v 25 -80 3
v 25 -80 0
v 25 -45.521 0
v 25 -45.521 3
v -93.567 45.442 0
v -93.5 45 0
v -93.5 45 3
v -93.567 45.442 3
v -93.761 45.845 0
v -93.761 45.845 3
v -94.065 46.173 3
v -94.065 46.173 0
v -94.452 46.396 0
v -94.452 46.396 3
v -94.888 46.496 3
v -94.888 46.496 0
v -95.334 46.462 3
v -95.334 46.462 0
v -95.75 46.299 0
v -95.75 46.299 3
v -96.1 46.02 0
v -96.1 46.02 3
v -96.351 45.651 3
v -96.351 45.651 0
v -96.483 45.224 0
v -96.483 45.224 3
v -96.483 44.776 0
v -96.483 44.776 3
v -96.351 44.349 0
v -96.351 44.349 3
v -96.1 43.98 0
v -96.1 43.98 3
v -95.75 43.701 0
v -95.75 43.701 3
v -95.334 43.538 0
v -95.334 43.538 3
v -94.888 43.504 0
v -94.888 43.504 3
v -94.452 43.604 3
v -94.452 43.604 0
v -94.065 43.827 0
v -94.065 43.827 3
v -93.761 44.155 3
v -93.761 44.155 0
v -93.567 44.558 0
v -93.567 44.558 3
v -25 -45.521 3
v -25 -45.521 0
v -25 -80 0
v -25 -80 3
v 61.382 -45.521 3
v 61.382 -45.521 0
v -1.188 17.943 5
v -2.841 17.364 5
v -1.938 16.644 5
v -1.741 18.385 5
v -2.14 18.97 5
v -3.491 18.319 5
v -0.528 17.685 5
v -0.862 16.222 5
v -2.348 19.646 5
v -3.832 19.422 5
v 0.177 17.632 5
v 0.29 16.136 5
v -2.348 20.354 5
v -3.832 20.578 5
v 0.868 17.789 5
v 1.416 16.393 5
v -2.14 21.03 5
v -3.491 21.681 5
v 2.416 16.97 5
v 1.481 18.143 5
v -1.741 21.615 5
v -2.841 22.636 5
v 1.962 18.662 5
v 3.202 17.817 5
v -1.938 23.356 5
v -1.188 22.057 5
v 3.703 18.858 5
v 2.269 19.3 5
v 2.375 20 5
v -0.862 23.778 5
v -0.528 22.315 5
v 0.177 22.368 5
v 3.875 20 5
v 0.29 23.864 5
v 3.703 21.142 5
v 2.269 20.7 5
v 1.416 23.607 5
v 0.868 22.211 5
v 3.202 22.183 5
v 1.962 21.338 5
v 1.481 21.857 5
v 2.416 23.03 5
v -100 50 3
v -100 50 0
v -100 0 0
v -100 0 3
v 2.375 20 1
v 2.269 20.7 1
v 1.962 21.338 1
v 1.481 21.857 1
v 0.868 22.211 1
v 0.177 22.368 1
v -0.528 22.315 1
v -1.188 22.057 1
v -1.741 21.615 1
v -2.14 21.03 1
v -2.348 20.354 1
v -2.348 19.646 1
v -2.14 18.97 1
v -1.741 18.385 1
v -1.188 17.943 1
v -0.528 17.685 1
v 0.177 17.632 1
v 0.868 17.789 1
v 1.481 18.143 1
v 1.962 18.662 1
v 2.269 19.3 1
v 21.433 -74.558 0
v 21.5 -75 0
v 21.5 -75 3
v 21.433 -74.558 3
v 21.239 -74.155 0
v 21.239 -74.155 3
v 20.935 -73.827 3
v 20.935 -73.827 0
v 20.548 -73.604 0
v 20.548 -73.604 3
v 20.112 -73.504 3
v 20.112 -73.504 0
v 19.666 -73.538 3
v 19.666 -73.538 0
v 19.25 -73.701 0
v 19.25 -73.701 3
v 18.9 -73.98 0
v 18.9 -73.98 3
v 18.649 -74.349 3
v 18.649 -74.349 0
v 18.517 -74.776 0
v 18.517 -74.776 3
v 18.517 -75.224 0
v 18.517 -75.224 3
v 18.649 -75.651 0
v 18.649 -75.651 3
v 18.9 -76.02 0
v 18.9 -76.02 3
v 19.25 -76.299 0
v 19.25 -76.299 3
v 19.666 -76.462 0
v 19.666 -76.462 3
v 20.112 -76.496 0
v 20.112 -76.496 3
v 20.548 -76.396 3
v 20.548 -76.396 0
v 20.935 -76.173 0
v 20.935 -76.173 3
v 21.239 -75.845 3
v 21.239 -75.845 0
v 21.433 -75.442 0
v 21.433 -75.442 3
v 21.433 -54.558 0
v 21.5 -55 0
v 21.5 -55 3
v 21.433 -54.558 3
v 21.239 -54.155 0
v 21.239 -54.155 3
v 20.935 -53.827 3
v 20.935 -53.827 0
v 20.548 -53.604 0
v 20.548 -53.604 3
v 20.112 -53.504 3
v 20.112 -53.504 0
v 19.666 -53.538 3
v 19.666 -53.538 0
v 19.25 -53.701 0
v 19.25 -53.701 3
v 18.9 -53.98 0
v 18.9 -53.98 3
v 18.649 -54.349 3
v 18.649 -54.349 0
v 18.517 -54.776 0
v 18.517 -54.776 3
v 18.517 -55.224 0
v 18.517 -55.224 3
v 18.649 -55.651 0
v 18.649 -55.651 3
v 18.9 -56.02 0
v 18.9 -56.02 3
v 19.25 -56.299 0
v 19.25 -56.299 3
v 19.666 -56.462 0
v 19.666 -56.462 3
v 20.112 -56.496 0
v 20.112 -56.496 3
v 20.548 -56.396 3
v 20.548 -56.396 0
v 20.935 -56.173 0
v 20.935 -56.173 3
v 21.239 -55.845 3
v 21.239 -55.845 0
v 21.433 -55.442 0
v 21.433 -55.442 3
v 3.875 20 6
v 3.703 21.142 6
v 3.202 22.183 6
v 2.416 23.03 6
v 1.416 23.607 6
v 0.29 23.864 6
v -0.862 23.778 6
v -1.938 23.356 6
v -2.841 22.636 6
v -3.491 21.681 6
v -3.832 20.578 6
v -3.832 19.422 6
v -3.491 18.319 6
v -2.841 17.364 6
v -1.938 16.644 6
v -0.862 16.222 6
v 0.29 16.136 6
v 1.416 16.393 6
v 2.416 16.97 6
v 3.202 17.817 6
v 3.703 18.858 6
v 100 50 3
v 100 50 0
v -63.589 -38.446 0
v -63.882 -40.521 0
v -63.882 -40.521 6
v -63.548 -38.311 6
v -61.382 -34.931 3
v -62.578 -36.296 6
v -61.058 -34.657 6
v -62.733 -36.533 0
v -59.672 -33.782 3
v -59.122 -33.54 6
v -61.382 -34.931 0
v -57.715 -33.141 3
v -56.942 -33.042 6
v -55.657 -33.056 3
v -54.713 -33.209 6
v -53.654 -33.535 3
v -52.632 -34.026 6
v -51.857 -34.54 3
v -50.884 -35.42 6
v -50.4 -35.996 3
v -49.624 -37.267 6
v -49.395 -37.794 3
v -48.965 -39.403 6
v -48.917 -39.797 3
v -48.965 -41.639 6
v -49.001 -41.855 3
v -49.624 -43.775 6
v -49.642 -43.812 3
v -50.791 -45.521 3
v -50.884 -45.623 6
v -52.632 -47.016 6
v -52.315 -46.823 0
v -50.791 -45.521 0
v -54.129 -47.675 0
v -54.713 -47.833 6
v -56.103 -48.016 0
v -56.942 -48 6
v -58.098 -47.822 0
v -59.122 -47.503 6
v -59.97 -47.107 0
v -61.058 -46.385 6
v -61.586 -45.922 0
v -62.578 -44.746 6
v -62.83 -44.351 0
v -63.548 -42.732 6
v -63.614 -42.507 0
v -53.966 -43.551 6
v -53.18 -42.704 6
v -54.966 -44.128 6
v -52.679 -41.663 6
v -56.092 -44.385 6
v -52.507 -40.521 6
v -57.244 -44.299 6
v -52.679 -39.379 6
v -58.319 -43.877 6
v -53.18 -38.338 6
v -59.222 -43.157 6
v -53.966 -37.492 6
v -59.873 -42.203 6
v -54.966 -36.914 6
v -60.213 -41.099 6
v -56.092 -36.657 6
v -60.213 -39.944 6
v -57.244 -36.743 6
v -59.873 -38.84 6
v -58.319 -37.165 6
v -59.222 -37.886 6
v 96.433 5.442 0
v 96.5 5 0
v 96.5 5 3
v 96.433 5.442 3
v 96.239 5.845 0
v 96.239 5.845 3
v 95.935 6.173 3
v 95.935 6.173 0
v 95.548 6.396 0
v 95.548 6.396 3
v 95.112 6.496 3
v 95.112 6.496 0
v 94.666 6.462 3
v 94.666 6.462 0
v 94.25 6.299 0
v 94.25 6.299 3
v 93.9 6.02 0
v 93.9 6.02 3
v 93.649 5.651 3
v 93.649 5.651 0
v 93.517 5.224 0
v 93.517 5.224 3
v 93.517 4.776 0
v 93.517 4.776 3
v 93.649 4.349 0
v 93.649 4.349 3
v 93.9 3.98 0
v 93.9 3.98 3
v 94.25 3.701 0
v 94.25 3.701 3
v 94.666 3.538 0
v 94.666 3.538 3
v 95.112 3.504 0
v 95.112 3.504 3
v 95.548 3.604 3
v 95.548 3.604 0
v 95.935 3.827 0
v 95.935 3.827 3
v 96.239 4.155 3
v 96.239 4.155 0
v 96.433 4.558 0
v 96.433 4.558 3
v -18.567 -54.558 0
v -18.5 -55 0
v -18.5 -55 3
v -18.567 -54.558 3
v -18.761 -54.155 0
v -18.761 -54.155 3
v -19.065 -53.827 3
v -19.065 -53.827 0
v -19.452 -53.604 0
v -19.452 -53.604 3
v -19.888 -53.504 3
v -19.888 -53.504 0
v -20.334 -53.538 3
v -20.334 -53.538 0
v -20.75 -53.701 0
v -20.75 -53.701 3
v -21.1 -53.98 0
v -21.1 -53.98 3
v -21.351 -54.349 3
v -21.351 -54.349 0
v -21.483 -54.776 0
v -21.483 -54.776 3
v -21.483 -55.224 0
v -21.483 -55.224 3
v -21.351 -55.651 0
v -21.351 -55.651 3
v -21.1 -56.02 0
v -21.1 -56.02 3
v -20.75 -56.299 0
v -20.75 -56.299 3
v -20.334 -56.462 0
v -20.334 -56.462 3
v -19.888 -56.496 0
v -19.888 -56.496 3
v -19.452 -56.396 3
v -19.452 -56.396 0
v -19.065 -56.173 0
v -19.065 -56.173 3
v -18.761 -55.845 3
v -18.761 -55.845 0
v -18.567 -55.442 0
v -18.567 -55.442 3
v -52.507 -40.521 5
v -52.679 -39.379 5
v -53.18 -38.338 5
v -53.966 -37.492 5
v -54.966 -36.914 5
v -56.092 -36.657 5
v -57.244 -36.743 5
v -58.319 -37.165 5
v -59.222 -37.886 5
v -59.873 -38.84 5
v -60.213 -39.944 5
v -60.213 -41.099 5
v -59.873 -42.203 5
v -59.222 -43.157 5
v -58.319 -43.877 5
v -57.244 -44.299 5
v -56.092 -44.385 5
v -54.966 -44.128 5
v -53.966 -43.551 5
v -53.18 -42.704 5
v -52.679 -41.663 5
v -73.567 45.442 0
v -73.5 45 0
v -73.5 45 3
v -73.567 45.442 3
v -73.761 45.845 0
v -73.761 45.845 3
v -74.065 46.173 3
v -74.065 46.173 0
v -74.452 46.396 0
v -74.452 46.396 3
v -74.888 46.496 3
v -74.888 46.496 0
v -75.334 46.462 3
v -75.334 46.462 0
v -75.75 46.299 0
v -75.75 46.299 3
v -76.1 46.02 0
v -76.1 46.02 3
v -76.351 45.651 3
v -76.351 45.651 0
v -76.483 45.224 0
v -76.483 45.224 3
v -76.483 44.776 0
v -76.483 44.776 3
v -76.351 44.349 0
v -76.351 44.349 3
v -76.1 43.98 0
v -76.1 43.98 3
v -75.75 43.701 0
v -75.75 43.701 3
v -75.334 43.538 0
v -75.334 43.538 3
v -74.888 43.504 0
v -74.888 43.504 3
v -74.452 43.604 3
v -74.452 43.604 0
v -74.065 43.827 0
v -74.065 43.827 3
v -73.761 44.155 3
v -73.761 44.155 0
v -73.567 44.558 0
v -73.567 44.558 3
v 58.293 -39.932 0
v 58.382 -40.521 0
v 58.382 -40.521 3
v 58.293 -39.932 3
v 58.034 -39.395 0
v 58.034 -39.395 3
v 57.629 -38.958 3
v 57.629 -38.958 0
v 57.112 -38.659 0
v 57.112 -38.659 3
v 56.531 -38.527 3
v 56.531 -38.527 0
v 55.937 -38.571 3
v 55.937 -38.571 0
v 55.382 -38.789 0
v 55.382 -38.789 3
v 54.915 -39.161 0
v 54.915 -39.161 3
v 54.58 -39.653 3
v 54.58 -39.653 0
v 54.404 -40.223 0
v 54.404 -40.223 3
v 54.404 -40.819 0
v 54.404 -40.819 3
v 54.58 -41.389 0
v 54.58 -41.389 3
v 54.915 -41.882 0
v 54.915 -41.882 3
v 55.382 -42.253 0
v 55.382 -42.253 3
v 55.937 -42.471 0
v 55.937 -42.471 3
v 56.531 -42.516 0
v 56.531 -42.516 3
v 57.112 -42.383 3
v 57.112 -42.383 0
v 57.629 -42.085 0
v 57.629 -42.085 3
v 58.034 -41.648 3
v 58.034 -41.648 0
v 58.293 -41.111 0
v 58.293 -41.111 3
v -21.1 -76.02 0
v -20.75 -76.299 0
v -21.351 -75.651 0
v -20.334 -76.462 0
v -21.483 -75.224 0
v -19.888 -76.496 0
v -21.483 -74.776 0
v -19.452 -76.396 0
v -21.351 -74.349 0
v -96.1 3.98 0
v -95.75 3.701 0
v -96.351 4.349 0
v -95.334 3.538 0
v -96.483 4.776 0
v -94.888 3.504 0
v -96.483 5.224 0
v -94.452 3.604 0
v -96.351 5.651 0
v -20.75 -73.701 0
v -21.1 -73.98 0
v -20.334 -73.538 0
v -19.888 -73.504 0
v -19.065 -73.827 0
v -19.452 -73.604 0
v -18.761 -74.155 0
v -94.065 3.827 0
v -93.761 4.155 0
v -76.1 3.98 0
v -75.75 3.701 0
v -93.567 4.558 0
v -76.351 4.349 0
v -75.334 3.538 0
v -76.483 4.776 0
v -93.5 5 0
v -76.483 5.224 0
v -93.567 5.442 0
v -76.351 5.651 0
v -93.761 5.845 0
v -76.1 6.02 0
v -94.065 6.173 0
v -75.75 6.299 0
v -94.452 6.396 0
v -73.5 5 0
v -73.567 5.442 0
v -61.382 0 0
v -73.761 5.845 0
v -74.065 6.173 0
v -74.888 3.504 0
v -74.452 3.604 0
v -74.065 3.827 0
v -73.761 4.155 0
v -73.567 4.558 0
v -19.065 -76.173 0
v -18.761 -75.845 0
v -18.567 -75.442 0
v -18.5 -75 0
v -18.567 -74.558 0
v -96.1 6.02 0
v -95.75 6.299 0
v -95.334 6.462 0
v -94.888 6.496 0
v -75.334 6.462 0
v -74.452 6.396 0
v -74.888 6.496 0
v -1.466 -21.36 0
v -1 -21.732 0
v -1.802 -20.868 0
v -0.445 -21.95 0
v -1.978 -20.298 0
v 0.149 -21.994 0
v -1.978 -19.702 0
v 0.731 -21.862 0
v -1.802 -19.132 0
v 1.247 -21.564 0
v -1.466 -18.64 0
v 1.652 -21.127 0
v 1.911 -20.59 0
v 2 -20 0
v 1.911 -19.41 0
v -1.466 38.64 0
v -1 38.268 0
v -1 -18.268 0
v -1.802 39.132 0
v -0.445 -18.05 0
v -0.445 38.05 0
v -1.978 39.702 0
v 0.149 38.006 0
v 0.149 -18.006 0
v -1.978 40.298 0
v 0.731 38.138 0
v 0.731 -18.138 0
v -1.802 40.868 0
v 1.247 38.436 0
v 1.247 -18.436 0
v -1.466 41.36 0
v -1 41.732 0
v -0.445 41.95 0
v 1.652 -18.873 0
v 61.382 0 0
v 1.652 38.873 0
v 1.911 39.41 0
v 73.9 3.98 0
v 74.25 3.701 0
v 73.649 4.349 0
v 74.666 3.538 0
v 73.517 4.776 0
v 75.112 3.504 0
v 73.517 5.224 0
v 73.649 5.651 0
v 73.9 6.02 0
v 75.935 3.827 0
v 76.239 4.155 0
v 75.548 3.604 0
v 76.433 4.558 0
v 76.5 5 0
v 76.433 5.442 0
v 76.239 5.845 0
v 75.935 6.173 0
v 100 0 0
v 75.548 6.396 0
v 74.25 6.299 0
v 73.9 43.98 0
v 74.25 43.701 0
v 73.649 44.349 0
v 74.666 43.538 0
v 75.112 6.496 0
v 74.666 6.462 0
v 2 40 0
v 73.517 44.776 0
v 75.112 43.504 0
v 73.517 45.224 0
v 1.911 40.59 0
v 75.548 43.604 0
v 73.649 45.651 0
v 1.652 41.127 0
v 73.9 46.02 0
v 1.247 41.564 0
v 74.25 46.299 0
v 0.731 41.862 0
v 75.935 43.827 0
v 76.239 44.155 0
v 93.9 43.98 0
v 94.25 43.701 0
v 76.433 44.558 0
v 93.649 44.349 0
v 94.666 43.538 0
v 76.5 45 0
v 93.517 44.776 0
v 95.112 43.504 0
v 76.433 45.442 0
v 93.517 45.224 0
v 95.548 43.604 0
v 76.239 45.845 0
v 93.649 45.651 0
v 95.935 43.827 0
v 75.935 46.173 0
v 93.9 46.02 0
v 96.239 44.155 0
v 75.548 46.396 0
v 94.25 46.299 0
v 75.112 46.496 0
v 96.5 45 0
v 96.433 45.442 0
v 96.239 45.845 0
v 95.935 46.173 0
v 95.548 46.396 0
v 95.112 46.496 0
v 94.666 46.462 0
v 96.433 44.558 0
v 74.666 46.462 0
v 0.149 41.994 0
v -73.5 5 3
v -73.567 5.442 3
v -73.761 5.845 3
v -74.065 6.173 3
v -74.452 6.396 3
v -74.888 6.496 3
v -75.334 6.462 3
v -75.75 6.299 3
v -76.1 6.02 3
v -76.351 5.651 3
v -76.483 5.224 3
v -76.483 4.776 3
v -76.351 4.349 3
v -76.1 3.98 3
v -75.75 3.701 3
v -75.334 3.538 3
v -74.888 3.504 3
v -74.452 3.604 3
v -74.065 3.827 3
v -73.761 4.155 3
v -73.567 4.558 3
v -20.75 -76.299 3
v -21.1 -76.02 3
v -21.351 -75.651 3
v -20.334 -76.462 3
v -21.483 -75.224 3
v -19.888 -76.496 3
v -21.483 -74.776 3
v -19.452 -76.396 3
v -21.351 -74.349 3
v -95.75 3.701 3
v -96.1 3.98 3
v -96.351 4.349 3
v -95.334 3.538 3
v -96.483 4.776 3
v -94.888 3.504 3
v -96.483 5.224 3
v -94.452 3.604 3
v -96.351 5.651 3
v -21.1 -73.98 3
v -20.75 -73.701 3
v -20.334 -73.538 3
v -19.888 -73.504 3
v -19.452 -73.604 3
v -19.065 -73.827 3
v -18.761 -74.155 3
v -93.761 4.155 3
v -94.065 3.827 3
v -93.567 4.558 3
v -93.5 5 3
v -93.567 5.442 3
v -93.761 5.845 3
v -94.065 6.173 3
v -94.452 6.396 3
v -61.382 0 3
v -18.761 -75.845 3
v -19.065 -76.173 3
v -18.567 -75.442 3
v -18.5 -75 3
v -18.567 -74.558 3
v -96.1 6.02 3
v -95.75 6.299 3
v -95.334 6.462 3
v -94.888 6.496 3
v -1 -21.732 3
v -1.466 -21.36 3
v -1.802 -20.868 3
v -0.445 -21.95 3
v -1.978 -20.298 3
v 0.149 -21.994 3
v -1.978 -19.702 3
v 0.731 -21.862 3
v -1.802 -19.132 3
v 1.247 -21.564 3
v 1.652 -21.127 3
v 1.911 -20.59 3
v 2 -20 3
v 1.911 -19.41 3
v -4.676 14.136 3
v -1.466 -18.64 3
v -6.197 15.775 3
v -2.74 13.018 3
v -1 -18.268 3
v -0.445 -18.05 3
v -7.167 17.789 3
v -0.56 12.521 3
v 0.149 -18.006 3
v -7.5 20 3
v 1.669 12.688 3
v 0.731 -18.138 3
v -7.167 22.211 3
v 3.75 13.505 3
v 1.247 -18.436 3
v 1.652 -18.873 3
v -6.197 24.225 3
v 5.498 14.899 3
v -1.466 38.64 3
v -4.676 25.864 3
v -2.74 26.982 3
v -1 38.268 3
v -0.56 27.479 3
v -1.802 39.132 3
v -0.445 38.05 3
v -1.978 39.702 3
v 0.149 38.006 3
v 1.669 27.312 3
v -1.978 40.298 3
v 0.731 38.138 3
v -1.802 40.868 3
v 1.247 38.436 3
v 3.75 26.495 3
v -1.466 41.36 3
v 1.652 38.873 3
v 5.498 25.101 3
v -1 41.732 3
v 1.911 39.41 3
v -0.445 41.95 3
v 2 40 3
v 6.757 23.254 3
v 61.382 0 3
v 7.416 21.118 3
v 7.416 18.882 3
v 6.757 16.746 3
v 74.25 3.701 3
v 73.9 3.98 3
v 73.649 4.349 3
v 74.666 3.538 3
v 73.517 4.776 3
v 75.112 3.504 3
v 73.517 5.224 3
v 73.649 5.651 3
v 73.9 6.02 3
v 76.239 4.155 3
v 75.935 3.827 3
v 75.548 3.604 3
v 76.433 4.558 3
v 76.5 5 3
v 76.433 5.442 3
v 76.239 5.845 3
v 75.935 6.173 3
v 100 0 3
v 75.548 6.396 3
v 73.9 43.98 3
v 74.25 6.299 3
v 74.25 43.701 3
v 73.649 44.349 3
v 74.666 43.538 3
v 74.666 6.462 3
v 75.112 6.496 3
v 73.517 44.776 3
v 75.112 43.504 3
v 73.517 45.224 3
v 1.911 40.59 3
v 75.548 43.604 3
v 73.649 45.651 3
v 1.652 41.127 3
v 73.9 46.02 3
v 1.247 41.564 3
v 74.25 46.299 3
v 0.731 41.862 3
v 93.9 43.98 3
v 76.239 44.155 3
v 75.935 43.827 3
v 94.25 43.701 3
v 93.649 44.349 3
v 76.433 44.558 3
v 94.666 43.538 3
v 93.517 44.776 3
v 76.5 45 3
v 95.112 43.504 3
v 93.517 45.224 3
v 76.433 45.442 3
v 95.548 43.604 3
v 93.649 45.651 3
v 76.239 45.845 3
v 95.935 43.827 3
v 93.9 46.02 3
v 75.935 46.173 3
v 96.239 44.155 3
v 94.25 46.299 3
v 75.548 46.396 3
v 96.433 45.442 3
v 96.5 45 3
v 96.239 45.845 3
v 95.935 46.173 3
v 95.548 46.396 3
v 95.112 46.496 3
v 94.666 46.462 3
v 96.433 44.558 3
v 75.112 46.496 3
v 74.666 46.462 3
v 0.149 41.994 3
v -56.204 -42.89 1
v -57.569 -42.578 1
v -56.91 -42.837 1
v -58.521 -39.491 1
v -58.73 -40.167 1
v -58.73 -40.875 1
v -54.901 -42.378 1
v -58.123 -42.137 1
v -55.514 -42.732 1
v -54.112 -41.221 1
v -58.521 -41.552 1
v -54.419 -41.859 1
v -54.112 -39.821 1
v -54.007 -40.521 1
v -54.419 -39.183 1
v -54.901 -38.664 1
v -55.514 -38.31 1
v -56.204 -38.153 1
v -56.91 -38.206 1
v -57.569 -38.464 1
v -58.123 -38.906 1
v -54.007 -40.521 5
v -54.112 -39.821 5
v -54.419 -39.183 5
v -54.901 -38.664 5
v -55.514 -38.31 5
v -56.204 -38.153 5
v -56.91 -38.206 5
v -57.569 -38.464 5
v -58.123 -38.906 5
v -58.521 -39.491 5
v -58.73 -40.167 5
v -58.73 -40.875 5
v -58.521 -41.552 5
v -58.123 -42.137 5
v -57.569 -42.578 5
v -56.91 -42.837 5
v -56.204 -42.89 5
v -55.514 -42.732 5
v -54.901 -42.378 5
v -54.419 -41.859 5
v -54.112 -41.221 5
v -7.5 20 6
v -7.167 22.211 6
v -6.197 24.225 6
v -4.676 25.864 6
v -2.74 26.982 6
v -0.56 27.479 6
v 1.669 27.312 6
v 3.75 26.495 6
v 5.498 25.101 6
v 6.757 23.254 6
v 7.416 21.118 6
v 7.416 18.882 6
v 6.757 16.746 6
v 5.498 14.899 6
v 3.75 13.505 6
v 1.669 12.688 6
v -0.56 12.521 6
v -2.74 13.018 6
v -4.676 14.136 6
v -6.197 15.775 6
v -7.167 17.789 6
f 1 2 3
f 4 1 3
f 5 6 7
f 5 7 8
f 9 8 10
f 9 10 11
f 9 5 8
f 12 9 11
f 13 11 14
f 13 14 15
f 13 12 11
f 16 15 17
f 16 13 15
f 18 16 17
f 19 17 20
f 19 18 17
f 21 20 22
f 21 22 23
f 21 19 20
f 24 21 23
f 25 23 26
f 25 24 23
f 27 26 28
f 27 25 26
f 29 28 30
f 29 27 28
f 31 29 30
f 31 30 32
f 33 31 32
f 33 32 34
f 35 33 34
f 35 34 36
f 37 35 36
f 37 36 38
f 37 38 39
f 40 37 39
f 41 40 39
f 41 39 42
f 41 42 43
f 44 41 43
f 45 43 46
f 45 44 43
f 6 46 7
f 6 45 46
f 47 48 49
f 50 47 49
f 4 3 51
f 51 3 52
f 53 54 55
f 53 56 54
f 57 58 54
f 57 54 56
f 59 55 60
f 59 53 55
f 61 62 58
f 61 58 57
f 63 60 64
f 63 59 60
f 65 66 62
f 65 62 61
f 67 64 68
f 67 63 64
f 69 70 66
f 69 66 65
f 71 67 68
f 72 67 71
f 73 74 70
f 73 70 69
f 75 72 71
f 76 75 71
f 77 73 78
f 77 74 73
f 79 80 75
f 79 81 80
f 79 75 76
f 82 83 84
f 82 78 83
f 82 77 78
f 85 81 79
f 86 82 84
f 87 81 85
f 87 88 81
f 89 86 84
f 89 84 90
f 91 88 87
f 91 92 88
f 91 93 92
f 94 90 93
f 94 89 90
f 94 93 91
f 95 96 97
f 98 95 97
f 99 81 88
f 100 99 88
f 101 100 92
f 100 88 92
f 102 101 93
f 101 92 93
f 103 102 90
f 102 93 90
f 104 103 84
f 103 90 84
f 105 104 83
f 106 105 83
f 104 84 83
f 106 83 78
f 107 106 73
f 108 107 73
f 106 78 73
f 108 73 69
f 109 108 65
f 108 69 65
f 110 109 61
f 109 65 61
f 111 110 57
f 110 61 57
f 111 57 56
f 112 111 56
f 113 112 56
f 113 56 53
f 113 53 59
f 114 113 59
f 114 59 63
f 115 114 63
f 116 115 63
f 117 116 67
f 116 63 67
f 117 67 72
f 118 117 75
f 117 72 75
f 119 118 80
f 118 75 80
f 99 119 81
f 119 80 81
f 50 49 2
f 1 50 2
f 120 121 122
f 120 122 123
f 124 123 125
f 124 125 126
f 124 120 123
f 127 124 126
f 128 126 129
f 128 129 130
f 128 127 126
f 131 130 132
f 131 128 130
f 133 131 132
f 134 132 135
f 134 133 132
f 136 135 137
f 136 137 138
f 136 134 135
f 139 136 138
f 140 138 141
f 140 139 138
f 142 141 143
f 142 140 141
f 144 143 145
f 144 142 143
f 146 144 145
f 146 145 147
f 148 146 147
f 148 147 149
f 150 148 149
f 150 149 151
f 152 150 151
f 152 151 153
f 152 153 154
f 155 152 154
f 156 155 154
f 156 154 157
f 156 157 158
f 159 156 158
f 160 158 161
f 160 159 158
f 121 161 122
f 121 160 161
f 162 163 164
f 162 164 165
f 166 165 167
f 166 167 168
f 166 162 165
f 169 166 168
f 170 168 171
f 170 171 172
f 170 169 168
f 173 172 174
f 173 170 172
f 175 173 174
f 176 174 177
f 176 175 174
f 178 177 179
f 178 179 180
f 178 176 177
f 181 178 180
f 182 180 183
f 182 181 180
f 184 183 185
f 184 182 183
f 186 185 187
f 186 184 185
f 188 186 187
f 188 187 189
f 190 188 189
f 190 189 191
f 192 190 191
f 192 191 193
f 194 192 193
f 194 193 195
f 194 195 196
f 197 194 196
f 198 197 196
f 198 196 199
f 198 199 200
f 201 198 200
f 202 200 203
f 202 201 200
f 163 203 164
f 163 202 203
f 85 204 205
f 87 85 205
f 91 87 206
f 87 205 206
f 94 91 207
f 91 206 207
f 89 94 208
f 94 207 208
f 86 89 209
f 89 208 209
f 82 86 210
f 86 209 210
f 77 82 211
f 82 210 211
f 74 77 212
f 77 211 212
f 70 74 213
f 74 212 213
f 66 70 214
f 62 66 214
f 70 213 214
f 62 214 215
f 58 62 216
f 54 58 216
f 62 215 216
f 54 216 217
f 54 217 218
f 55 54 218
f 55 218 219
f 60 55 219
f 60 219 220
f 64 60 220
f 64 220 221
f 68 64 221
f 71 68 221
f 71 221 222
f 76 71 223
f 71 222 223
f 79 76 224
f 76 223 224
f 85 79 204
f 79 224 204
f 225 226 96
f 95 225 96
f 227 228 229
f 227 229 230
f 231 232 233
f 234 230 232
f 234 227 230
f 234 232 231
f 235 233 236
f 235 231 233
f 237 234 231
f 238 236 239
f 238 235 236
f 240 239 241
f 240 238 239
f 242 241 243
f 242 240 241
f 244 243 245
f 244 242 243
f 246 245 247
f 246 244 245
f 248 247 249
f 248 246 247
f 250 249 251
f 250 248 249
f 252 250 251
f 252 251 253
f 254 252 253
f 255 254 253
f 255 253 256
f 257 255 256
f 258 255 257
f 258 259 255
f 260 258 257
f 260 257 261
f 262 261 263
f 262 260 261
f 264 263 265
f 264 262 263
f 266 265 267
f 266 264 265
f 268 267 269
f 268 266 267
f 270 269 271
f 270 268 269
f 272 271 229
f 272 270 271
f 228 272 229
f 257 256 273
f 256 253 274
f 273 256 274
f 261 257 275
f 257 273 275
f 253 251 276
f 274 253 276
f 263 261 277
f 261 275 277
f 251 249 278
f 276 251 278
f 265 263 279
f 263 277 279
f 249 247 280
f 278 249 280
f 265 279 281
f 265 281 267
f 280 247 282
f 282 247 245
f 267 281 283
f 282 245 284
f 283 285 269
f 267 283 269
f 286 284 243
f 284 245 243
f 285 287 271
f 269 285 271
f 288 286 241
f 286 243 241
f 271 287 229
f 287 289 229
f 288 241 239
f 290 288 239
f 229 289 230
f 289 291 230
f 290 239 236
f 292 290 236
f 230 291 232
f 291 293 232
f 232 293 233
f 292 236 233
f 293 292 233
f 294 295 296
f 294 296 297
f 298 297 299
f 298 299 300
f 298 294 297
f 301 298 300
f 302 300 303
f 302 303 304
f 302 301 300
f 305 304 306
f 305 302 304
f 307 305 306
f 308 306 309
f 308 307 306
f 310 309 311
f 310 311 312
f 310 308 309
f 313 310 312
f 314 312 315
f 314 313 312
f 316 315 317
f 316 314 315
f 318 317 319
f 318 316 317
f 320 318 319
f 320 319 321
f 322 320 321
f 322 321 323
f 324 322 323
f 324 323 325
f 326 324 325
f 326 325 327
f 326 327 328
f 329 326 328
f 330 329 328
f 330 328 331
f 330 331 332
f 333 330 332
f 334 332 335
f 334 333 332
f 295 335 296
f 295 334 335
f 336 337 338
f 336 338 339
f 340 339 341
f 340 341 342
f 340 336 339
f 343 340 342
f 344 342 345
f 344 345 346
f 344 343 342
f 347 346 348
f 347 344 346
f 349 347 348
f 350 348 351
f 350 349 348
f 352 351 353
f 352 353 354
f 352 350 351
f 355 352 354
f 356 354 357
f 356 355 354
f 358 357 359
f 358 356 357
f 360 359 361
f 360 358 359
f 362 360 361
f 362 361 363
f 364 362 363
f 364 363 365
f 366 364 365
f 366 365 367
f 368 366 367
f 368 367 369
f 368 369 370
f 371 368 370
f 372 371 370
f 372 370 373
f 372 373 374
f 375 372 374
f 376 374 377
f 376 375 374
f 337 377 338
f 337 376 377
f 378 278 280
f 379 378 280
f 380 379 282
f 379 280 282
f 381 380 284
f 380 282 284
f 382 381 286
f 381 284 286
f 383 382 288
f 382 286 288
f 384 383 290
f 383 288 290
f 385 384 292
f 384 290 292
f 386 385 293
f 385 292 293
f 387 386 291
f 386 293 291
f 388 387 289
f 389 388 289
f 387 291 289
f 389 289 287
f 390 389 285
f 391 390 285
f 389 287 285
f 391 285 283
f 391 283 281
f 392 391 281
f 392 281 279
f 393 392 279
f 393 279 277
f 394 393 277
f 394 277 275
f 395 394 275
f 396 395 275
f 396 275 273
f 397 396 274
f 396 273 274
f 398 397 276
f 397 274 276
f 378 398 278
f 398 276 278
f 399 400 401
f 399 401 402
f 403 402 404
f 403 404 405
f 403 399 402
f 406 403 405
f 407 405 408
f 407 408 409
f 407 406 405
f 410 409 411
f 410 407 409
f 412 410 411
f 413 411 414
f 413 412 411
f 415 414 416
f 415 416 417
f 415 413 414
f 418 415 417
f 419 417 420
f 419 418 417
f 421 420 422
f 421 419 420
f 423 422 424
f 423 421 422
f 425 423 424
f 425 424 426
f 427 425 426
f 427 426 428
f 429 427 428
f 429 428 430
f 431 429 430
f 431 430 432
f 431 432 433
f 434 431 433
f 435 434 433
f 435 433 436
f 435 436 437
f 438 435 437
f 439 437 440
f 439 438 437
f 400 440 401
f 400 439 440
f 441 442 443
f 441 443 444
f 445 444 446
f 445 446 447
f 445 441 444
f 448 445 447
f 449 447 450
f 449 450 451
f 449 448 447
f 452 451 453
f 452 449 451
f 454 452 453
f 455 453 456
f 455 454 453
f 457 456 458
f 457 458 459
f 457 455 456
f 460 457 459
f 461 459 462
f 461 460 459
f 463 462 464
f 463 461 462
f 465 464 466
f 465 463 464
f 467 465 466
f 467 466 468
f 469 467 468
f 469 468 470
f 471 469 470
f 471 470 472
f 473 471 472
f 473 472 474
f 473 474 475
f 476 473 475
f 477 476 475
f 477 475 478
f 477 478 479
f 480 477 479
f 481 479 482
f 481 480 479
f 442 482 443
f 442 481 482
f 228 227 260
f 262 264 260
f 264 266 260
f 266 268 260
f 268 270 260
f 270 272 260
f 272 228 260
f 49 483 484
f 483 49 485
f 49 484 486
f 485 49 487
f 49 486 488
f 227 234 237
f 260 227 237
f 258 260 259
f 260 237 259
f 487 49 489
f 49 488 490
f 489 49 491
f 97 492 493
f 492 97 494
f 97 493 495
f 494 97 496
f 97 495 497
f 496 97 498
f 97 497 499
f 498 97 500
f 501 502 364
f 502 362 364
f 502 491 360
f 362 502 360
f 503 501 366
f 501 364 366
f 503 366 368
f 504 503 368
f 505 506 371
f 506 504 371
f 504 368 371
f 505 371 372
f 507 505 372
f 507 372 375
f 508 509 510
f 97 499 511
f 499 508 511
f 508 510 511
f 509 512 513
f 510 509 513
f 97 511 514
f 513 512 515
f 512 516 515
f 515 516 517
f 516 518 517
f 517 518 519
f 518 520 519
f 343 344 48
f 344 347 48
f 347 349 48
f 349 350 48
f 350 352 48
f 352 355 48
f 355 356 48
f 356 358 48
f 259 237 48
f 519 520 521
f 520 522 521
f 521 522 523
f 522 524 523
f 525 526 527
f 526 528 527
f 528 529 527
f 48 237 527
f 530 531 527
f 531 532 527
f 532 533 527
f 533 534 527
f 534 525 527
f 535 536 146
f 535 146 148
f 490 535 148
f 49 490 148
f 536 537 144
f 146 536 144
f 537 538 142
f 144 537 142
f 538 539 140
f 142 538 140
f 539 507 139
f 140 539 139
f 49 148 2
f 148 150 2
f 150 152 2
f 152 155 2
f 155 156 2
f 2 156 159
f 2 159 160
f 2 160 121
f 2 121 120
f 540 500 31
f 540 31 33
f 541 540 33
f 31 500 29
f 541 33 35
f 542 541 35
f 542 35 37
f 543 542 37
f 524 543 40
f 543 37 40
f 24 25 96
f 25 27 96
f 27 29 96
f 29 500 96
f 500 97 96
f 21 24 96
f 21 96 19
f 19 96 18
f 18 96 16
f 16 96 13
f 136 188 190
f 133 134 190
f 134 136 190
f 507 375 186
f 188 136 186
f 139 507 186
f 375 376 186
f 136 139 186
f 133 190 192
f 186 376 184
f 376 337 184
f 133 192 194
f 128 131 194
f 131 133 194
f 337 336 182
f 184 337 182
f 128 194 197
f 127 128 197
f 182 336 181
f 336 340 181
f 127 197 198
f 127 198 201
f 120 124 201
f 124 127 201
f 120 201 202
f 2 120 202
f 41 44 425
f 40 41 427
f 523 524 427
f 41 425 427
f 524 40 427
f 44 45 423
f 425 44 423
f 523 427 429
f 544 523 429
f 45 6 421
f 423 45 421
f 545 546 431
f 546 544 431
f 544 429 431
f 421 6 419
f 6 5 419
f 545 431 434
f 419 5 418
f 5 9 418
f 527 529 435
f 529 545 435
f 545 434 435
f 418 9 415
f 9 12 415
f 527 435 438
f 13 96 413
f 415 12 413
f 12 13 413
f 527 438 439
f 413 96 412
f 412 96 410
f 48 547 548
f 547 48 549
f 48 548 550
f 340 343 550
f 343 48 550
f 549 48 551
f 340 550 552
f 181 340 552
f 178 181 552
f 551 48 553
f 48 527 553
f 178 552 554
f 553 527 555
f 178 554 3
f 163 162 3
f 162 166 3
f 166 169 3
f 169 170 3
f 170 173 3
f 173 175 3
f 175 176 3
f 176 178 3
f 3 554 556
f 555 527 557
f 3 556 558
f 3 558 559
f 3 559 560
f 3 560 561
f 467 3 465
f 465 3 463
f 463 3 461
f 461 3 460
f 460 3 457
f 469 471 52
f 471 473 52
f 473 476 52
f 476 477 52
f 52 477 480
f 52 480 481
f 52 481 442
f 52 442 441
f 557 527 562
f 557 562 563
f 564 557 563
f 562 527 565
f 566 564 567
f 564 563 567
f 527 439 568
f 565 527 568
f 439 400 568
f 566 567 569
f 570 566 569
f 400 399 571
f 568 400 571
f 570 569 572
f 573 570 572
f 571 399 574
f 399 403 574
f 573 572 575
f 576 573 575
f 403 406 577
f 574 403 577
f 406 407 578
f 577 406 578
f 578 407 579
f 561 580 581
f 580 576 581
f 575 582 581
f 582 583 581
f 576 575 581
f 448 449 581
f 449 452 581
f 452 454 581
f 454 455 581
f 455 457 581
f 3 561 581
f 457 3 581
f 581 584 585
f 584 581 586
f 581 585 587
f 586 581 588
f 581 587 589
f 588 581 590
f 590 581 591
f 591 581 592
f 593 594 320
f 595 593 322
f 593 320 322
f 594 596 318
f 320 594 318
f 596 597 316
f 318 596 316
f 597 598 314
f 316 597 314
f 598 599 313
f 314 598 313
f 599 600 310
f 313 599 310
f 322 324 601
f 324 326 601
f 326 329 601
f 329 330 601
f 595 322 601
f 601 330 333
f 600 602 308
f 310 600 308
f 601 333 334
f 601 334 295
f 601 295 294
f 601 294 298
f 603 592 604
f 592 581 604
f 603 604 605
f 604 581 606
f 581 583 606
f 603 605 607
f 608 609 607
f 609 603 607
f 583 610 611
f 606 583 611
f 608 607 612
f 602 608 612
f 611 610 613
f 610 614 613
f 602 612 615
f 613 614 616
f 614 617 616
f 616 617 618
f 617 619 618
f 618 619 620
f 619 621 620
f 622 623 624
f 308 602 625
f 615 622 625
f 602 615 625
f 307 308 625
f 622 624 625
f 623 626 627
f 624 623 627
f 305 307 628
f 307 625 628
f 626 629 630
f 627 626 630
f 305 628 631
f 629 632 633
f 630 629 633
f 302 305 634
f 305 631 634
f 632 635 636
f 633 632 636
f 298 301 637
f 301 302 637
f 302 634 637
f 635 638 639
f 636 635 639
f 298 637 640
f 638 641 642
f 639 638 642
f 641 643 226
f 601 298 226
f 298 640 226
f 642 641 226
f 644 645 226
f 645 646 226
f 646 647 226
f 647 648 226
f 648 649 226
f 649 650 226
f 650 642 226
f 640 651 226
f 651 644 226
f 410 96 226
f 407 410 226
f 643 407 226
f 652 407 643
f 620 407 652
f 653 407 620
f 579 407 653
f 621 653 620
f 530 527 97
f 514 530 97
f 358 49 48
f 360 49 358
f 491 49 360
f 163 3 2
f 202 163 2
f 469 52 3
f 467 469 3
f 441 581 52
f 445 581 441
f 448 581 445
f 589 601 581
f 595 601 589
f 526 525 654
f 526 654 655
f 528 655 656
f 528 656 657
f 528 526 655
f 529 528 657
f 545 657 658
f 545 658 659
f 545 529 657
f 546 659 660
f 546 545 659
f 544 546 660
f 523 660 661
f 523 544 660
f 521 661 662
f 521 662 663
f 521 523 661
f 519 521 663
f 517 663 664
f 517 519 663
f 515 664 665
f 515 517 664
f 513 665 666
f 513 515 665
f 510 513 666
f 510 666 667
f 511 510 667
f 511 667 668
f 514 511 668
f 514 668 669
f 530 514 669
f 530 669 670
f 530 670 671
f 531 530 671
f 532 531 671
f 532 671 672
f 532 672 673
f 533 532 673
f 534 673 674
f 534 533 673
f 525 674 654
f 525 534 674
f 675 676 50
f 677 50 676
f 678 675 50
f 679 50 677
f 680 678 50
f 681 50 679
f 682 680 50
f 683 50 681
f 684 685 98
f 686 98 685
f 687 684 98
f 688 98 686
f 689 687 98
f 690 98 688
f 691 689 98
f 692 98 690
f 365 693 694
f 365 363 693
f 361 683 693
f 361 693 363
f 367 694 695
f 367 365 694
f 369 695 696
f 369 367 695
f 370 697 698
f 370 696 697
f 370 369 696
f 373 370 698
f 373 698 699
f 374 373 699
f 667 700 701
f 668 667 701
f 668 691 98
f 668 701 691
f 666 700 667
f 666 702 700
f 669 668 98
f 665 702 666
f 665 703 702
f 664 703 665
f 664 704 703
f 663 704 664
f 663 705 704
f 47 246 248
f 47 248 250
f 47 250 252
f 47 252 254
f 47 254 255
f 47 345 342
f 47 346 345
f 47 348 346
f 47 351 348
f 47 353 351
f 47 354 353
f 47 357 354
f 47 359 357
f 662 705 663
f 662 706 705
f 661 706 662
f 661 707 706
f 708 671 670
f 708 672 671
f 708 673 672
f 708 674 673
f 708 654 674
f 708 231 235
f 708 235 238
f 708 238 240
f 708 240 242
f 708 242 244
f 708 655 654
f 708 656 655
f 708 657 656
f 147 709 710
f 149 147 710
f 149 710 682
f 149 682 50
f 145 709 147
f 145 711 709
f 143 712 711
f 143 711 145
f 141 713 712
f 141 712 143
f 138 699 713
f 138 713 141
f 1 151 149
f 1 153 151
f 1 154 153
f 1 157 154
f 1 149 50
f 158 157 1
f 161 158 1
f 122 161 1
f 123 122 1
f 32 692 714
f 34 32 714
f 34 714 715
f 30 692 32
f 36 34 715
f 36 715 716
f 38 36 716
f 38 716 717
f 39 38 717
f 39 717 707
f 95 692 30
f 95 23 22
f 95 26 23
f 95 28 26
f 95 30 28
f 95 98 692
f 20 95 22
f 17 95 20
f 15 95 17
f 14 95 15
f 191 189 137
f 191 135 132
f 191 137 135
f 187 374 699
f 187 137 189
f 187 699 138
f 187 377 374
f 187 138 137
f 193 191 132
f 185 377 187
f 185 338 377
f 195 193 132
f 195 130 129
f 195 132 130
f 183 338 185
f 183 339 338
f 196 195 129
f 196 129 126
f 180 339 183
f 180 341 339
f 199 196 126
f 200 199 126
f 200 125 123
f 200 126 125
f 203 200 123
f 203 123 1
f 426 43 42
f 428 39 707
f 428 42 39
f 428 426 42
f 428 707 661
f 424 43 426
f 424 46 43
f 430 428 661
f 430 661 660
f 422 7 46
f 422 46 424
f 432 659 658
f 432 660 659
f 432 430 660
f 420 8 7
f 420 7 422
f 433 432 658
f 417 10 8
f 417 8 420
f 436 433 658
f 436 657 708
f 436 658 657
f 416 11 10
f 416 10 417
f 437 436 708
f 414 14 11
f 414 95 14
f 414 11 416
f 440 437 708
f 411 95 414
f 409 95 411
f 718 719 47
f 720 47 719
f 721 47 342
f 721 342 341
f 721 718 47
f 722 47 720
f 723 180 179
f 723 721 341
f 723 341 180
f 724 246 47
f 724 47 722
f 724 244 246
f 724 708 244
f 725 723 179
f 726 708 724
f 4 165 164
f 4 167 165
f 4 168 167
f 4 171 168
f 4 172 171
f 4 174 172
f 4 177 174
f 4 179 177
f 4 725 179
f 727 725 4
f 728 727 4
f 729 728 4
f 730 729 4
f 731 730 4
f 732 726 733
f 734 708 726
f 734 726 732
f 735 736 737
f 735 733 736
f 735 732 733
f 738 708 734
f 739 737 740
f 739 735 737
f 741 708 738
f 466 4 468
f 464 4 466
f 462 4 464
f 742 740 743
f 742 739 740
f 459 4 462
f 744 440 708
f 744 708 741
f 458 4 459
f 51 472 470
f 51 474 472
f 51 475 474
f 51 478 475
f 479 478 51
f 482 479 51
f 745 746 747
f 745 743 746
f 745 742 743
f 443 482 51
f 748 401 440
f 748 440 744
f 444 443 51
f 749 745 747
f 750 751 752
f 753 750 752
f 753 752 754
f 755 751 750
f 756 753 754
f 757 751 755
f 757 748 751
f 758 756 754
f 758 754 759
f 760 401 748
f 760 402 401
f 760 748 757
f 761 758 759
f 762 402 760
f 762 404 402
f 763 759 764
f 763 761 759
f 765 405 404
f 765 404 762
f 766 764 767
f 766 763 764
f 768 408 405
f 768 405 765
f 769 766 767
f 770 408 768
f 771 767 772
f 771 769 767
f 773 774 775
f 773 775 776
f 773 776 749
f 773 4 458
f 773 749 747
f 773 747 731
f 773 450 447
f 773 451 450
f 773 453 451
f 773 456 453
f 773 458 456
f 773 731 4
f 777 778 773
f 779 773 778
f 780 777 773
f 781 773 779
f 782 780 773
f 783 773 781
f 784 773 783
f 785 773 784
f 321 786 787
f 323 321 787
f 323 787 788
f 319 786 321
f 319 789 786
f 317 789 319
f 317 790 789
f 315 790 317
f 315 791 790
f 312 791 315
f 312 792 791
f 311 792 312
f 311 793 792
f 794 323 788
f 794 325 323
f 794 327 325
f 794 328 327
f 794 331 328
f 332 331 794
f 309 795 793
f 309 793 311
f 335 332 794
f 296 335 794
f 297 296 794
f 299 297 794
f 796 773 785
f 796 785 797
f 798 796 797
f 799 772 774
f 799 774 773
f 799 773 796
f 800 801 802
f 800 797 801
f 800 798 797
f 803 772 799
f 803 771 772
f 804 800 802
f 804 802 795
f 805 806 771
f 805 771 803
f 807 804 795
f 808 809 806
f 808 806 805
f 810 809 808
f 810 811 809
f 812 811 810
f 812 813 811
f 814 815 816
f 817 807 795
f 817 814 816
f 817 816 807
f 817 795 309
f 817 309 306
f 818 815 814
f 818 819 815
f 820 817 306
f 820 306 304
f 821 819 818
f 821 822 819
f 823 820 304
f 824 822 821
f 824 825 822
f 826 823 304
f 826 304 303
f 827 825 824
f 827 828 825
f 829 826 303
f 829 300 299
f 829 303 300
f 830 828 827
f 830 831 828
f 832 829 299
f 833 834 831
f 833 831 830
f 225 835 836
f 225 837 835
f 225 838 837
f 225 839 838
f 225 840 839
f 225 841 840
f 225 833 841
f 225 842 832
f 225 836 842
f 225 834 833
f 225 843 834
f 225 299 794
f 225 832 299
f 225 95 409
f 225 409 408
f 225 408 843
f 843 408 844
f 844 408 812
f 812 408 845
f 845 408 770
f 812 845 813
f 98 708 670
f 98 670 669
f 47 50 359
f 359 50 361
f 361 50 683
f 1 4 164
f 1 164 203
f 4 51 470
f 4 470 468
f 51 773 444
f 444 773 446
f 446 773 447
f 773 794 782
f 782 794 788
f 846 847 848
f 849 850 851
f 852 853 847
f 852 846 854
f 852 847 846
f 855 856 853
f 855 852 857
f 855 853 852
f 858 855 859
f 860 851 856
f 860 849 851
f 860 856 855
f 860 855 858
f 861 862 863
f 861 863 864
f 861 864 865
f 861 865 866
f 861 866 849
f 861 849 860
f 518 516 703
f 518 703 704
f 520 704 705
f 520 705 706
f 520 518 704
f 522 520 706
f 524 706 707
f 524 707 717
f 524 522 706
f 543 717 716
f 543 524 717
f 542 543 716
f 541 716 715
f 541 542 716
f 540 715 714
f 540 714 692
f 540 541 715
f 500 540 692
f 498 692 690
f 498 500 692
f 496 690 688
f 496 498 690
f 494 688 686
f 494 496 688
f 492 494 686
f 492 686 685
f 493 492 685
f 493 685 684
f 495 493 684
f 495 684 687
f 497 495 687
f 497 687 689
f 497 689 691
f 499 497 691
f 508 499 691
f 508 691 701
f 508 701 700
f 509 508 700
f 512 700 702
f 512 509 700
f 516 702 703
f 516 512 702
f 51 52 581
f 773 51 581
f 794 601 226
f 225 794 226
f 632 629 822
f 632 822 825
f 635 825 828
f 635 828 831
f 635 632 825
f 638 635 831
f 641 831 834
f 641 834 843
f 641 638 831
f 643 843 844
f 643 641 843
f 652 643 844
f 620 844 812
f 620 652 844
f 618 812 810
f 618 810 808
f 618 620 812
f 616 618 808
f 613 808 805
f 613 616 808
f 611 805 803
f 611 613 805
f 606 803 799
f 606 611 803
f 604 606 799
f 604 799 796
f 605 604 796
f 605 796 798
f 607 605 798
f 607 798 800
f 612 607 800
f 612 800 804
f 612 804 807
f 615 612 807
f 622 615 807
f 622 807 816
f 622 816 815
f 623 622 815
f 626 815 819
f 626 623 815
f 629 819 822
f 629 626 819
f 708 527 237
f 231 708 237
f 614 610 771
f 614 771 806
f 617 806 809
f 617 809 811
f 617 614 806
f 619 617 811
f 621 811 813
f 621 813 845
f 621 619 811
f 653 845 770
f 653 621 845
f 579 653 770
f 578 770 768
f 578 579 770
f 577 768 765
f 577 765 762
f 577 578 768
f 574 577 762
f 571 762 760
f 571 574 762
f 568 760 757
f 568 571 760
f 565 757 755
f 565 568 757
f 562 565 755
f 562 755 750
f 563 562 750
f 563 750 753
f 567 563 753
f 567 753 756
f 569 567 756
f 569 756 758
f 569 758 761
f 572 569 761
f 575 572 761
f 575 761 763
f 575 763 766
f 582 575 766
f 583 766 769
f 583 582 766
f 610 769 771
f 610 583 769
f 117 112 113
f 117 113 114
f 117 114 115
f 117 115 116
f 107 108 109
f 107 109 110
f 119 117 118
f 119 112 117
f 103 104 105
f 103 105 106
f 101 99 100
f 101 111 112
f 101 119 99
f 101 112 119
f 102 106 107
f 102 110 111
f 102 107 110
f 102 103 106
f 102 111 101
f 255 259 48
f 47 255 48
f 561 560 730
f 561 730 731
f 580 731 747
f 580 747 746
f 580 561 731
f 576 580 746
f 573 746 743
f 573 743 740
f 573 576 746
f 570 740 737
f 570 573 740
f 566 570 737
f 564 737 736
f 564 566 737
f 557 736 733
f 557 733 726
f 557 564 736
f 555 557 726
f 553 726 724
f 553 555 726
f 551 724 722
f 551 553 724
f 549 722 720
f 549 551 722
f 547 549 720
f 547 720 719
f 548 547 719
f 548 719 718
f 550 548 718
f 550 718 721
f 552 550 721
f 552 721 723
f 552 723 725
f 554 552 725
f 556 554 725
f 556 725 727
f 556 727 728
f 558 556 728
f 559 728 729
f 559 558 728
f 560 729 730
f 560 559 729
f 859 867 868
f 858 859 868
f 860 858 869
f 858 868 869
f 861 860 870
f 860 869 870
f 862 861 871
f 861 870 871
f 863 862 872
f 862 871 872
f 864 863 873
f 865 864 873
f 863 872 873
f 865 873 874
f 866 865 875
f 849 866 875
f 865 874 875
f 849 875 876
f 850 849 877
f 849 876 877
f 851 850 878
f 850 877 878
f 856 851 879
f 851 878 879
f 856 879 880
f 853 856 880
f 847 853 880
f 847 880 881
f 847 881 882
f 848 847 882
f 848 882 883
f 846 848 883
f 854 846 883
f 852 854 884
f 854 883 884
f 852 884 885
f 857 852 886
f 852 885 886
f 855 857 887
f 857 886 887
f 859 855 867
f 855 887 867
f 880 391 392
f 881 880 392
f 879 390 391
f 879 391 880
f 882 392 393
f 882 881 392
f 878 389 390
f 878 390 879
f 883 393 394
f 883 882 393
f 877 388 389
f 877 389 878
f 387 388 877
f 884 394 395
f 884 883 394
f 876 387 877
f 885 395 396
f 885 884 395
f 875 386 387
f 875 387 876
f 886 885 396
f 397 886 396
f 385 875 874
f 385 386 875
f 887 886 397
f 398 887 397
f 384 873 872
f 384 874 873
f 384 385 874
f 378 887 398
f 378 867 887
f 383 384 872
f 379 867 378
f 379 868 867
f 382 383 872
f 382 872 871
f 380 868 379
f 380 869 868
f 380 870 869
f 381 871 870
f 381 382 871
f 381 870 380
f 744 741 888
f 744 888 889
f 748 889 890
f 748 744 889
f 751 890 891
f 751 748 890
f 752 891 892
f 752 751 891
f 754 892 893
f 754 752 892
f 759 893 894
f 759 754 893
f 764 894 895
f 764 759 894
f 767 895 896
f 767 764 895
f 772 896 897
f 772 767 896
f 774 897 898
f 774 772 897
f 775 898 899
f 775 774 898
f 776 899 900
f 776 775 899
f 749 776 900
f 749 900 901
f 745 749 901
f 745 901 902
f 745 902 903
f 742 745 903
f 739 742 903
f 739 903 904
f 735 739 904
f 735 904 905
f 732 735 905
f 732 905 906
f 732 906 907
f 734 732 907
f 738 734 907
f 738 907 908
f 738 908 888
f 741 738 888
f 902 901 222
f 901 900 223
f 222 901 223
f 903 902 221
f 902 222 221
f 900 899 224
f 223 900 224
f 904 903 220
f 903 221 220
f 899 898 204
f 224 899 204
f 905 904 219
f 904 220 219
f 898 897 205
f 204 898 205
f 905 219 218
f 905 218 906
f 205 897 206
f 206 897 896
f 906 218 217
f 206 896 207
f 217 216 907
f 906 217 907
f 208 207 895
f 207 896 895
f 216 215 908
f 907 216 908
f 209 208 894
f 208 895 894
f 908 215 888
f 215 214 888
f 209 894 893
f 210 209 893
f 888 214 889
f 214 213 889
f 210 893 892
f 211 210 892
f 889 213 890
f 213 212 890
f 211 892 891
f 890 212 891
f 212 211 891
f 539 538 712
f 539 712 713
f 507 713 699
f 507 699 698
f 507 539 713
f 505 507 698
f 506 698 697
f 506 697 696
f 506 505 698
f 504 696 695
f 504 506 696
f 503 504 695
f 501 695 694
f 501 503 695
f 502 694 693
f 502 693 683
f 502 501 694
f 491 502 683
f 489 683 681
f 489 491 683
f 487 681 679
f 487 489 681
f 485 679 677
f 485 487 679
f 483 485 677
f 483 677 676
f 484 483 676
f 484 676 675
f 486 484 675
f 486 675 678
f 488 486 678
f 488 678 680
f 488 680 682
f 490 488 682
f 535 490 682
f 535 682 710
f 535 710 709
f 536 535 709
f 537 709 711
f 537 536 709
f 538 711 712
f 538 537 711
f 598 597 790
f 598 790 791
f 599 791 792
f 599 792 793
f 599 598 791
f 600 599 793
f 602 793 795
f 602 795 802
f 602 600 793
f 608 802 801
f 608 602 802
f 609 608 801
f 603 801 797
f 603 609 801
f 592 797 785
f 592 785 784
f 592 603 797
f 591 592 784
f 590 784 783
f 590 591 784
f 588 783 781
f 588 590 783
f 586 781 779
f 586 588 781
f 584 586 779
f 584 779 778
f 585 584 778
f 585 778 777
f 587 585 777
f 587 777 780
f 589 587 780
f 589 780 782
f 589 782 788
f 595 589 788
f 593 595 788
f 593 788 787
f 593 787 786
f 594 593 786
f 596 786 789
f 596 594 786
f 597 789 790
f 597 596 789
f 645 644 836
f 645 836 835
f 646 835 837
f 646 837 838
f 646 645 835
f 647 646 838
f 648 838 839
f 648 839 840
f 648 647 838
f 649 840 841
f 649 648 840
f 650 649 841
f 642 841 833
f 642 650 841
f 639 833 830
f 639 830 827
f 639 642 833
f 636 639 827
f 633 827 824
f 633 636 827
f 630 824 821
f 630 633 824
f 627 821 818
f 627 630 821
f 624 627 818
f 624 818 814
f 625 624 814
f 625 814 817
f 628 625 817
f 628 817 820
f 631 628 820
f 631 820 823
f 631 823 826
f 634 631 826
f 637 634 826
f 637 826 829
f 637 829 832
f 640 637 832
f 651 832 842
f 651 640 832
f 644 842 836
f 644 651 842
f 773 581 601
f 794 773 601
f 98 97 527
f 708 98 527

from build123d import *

# Parameters (mm, degrees)
ESQUISSE1_R             = 2
ESQUISSE1_R_2           = 1.5
BOSS_EXTRU_1_DEPTH      = 3
ESQUISSE3_R             = 7.5
BOSS_EXTRU_2_DEPTH      = 6
ESQUISSE4_R             = 3.875
ENL_V_MAT_EXTRU_1_DEPTH = 1
ESQUISSE5_R             = 2.375
ENL_V_MAT_EXTRU_2_DEPTH = 4


with BuildPart() as part:
    # Esquisse1 → Boss.-Extru.1 (new body)
    with BuildSketch(Plane.XY):
        Polygon((0, 50), (-100, 50), (-100, 0), (-61.381557247, 0), (-61.381557247, -45.5212086), (-25, -45.5212086), (-25, -80), (25, -80), (25, -45.5212086), (61.381557247, -45.5212086), (61.381557247, 0), (100, 0), (100, 50), align=None)
        with Locations((0, 20)):
            Circle(ESQUISSE1_R, mode=Mode.SUBTRACT)
        with Locations((0, -20)):
            Circle(ESQUISSE1_R, mode=Mode.SUBTRACT)
        with Locations((0, 40)):
            Circle(ESQUISSE1_R, mode=Mode.SUBTRACT)
        with Locations((-20, -55)):
            Circle(ESQUISSE1_R_2, mode=Mode.SUBTRACT)
        with Locations((20, -55)):
            Circle(ESQUISSE1_R_2, mode=Mode.SUBTRACT)
        with Locations((20, -75)):
            Circle(ESQUISSE1_R_2, mode=Mode.SUBTRACT)
        with Locations((-20, -75)):
            Circle(ESQUISSE1_R_2, mode=Mode.SUBTRACT)
        with Locations((-95, 45)):
            Circle(ESQUISSE1_R_2, mode=Mode.SUBTRACT)
        with Locations((-75, 45)):
            Circle(ESQUISSE1_R_2, mode=Mode.SUBTRACT)
        with Locations((-75, 5)):
            Circle(ESQUISSE1_R_2, mode=Mode.SUBTRACT)
        with Locations((-95, 5)):
            Circle(ESQUISSE1_R_2, mode=Mode.SUBTRACT)
        with Locations((75, 5)):
            Circle(ESQUISSE1_R_2, mode=Mode.SUBTRACT)
        with Locations((95, 5)):
            Circle(ESQUISSE1_R_2, mode=Mode.SUBTRACT)
        with Locations((75, 45)):
            Circle(ESQUISSE1_R_2, mode=Mode.SUBTRACT)
        with Locations((95, 45)):
            Circle(ESQUISSE1_R_2, mode=Mode.SUBTRACT)
        with Locations((56.381557247, -40.5212086)):
            Circle(ESQUISSE1_R, mode=Mode.SUBTRACT)
        with Locations((-56.381557247, -40.5212086)):
            Circle(ESQUISSE1_R, mode=Mode.SUBTRACT)
    extrude(amount=BOSS_EXTRU_1_DEPTH)

    # Esquisse3 → Boss.-Extru.2 (add)
    with BuildSketch(Plane(origin=(0, 0, 0), x_dir=(-1, 0, 0), z_dir=(0, 0, -1))):
        with Locations((0, 20)):
            Circle(ESQUISSE3_R)
        with Locations((56.381557247, -40.5212086)):
            Circle(ESQUISSE3_R)
    extrude(amount=-BOSS_EXTRU_2_DEPTH)

    # Esquisse4 → Enlèv. mat.-Extru.1 (cut)
    with BuildSketch(Plane.XY.offset(6)):
        with Locations((-56.381557247, -40.5212086)):
            Circle(ESQUISSE4_R)
        with Locations((0, 20)):
            Circle(ESQUISSE4_R)
    extrude(amount=-ENL_V_MAT_EXTRU_1_DEPTH, mode=Mode.SUBTRACT)

    # Esquisse5 → Enlèv. mat.-Extru.2 (cut)
    with BuildSketch(Plane.XY.offset(5)):
        with Locations((-56.381557247, -40.5212086)):
            Circle(ESQUISSE5_R)
        with Locations((0, 20)):
            Circle(ESQUISSE5_R)
    extrude(amount=-ENL_V_MAT_EXTRU_2_DEPTH, mode=Mode.SUBTRACT)


solid = part.part
